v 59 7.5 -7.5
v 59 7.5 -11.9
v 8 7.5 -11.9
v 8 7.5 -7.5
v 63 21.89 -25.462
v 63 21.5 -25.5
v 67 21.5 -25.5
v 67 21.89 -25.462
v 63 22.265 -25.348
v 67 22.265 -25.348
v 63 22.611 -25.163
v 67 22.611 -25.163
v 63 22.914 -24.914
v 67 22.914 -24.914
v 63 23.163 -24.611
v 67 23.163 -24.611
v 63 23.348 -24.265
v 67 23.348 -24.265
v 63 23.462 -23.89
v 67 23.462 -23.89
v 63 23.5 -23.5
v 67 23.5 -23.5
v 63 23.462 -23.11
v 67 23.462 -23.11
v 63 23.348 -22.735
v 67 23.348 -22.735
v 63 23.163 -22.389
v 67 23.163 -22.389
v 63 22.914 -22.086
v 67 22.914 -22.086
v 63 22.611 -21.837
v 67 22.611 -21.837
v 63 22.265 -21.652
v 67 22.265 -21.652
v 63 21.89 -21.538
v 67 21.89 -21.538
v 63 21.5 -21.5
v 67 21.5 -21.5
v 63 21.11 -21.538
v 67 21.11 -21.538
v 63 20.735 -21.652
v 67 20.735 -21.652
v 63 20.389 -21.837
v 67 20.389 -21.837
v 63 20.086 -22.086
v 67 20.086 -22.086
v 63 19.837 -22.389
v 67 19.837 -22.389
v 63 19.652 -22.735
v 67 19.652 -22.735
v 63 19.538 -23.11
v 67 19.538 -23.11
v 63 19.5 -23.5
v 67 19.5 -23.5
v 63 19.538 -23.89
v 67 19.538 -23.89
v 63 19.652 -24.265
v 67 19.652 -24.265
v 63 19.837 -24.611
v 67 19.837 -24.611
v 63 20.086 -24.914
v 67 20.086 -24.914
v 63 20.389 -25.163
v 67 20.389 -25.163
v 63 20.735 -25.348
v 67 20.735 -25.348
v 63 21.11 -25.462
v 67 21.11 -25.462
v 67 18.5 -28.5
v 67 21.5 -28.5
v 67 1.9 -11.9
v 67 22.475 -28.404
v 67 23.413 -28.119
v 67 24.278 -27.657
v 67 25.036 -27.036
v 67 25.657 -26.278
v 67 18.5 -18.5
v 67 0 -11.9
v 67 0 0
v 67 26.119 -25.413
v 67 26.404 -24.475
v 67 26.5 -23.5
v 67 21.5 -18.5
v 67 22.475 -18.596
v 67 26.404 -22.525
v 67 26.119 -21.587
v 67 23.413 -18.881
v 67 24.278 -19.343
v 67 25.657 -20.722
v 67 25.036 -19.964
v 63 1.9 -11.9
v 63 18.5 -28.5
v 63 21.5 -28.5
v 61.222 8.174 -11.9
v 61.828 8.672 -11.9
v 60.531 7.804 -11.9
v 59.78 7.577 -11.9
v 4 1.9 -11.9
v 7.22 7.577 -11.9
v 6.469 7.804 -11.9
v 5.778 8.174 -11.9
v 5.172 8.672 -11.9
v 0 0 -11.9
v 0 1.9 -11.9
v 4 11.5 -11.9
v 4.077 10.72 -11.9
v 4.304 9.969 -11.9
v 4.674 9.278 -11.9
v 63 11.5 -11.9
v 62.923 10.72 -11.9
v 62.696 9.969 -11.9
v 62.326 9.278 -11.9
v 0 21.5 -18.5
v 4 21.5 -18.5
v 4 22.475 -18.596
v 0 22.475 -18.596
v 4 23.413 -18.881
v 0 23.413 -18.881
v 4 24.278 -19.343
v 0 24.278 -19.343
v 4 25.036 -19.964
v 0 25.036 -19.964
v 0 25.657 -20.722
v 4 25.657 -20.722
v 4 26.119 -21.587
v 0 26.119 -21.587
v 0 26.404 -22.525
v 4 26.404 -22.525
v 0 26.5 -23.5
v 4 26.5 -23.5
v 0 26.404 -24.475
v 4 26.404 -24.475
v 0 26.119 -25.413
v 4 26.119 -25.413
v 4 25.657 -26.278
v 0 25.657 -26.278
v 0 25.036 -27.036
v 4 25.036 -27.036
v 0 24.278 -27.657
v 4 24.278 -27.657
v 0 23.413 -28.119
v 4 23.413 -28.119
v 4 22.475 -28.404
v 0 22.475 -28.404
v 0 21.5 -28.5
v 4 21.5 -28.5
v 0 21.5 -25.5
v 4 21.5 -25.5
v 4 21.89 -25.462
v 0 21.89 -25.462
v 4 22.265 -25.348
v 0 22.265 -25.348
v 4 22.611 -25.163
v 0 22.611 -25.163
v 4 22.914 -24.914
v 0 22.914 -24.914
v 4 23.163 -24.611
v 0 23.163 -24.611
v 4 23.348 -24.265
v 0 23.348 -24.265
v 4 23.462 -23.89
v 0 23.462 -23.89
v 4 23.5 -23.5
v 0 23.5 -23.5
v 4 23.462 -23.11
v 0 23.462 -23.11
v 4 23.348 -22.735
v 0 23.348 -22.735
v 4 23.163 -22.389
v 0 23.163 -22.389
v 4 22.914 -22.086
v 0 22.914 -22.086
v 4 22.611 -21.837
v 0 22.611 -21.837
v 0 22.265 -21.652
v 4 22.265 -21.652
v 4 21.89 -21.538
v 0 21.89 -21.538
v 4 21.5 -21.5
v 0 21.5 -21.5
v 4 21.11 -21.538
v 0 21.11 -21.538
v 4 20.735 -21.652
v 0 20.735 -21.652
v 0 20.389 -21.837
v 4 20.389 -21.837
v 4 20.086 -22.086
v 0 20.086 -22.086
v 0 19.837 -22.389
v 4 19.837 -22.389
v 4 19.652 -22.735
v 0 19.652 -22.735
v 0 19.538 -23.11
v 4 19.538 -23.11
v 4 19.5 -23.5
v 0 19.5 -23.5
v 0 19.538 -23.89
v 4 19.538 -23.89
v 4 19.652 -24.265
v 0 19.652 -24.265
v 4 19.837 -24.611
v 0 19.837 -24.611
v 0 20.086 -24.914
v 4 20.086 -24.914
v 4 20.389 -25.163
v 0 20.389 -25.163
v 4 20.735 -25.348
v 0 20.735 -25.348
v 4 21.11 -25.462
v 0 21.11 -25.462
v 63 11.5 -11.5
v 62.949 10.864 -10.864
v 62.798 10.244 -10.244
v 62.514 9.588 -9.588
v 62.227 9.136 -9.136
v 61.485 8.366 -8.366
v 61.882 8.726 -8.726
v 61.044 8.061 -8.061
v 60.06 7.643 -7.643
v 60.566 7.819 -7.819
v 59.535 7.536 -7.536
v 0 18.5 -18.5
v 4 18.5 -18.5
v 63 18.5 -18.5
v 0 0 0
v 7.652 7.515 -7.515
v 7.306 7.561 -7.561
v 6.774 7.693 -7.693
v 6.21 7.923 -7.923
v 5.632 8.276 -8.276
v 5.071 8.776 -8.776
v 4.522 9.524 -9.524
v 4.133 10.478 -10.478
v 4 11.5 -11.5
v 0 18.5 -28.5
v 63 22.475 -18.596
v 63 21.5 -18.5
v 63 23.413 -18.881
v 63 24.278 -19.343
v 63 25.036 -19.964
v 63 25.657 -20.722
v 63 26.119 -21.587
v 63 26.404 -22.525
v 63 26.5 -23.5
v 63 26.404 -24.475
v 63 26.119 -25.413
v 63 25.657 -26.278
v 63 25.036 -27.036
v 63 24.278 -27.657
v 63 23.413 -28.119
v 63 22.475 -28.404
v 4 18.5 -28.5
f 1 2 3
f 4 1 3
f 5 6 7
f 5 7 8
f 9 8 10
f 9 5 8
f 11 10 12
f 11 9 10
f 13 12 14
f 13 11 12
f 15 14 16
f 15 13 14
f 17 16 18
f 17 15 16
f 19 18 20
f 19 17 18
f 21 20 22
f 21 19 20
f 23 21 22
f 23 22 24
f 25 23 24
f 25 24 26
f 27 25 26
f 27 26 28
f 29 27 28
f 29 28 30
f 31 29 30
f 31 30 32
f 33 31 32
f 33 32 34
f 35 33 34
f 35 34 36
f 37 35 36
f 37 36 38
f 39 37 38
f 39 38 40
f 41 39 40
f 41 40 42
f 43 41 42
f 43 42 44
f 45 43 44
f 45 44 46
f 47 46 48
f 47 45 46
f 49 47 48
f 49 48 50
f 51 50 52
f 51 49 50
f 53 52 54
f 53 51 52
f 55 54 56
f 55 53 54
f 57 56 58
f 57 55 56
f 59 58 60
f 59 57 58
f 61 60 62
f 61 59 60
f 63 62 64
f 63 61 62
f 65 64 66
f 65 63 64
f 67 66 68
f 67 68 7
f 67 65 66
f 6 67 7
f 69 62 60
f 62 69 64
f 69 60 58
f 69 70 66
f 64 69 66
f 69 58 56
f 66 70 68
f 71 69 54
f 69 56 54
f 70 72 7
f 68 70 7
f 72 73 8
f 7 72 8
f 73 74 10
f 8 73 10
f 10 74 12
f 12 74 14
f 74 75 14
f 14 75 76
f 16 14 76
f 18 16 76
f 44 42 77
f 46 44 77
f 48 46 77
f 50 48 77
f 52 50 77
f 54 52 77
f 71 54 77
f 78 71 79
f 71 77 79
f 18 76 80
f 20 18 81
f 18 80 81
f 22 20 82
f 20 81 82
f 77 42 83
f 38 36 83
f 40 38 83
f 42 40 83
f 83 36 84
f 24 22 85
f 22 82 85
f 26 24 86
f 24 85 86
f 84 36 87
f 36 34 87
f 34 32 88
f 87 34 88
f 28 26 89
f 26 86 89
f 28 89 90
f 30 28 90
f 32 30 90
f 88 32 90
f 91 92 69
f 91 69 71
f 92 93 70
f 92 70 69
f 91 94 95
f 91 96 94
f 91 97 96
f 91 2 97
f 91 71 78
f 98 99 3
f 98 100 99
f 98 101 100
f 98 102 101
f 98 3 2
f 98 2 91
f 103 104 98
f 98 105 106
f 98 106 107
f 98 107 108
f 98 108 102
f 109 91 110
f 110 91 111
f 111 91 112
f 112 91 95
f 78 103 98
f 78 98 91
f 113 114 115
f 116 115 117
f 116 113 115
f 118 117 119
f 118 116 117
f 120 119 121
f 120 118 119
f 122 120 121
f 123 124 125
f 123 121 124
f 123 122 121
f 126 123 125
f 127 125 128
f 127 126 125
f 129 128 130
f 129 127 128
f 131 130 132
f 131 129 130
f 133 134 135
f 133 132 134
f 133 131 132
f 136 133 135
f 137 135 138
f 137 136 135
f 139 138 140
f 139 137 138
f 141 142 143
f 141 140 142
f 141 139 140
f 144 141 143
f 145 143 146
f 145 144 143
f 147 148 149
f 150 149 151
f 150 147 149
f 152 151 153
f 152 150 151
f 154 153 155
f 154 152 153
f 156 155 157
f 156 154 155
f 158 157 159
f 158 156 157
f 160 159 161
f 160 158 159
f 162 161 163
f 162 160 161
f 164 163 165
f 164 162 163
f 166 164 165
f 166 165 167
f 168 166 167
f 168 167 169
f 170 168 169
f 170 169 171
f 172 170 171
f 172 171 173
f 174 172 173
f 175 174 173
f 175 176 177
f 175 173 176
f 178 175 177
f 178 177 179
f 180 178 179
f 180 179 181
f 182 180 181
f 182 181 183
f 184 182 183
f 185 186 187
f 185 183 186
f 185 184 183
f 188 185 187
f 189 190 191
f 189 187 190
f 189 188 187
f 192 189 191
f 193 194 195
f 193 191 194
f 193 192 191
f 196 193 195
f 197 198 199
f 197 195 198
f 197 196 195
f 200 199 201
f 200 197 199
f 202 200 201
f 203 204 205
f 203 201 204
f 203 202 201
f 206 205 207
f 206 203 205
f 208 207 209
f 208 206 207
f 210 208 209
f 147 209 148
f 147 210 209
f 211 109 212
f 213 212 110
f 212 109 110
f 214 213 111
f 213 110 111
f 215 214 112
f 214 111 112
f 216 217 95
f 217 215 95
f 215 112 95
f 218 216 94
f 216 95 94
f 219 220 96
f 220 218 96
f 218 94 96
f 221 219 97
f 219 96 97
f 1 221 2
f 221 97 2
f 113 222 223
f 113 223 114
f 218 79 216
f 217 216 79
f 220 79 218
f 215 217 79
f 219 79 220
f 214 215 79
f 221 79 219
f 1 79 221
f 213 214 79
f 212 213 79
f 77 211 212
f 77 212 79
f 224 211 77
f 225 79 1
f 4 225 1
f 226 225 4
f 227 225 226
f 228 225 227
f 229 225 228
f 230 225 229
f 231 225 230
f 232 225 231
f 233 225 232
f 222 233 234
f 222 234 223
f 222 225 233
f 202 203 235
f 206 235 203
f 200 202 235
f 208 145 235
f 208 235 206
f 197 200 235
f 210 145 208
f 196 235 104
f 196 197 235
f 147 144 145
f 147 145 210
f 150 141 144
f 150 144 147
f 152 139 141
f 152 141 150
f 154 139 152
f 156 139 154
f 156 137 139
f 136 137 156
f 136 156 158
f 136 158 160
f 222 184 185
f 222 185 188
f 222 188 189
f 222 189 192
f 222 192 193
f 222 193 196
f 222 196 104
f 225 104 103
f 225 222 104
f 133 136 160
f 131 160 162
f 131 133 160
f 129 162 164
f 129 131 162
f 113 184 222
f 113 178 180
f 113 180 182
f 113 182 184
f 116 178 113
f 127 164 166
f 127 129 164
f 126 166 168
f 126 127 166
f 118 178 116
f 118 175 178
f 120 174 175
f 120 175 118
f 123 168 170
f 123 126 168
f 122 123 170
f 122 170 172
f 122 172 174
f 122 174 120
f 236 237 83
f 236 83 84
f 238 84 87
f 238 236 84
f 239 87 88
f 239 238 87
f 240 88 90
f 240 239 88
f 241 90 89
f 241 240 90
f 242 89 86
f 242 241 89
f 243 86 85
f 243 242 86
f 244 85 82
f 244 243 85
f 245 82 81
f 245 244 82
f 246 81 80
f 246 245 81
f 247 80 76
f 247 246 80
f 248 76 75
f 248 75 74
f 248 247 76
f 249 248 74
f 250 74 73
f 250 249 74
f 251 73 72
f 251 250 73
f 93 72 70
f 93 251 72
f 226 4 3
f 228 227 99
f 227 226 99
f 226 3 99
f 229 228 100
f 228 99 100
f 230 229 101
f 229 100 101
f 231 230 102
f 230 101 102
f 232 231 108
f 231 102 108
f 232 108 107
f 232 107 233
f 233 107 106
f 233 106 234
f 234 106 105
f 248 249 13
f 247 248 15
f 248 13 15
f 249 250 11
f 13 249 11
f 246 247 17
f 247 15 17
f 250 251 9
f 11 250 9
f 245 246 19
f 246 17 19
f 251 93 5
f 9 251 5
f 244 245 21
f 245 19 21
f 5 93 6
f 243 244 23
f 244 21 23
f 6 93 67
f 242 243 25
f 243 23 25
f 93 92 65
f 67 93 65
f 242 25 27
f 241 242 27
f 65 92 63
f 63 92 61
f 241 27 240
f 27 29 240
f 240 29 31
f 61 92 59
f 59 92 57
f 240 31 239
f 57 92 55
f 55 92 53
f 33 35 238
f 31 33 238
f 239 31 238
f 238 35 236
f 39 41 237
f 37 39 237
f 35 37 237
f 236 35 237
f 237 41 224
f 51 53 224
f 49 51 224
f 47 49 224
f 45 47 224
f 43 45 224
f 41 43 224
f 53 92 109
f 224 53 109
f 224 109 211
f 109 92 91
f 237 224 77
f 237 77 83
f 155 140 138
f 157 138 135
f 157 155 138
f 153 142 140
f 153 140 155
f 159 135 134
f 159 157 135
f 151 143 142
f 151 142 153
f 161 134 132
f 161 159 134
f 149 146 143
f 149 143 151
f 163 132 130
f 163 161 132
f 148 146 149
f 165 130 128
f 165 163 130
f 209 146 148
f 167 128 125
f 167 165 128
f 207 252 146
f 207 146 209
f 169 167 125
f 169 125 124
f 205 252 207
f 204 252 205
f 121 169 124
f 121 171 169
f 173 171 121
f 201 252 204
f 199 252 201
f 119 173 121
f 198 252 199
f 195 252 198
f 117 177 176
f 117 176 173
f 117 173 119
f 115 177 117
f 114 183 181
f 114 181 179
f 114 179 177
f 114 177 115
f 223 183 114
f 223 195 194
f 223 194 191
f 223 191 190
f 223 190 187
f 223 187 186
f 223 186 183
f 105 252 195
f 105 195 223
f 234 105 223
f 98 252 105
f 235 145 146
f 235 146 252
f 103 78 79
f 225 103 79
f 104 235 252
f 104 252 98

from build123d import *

# Parameters (mm, degrees)
SKETCH1_R           = 2
BOSS_EXTRUDE1_DEPTH = 67
CUT_EXTRUDE1_REACH  = 30.5
CUT_EXTRUDE2_REACH  = 28.5
SKETCH3_W           = 59
SKETCH3_H           = 9.6


with BuildPart() as part:
    # Sketch1 → Boss-Extrude1 (new body)
    with BuildSketch(Plane(origin=(0, 0, 0), x_dir=(0, 0, -1), z_dir=(1, 0, 0))):
        with BuildLine():
            Line((11.9, 1.9), (11.9, 0))
            Line((11.9, 0), (0, 0))
            Line((0, 0), (18.5, 18.5))
            Line((18.5, 18.5), (18.5, 21.5))
            ThreePointArc((18.5, 21.5), (23.5, 26.5), (28.5, 21.5))
            Line((28.5, 21.5), (28.5, 18.5))
            Line((28.5, 18.5), (11.9, 1.9))
        make_face()
        with Locations((23.5, 21.5)):
            Circle(SKETCH1_R, mode=Mode.SUBTRACT)
    extrude(amount=BOSS_EXTRUDE1_DEPTH)

    # Sketch2 → Cut-Extrude1 (cut, up to next)
    with BuildSketch(Plane(origin=(0, 0, -28.5), x_dir=(-1, 0, 0), z_dir=(0, 0, -1)), mode=Mode.PRIVATE) as cut_extrude1_sk1:
        with BuildLine():
            Line((-63, 26.5), (-63, 11.5))
            ThreePointArc((-63, 11.5), (-61.828427125, 8.671572875), (-59, 7.5))
            Line((-59, 7.5), (-8, 7.5))
            ThreePointArc((-8, 7.5), (-5.171572875, 8.671572875), (-4, 11.5))
            Line((-4, 11.5), (-4, 26.5))
            Line((-4, 26.5), (-63, 26.5))
        make_face()
    cut_extrude1_tool1 = extrude(cut_extrude1_sk1.sketch, amount=-CUT_EXTRUDE1_REACH, mode=Mode.PRIVATE) & part.part
    add(cut_extrude1_tool1.solids().sort_by_distance((33.5, 17.053049, -28.5))[0], mode=Mode.SUBTRACT)

    # Sketch3 → Cut-Extrude2 (cut, up to next)
    with BuildSketch(Plane.XZ, mode=Mode.PRIVATE) as cut_extrude2_sk1:
        with Locations((33.5, -16.7)):
            Rectangle(SKETCH3_W, SKETCH3_H)
    cut_extrude2_tool1 = extrude(cut_extrude2_sk1.sketch, amount=-CUT_EXTRUDE2_REACH, mode=Mode.PRIVATE) & part.part
    add(cut_extrude2_tool1.solids().sort_by_distance((33.5, 0, -16.7))[0], mode=Mode.SUBTRACT)


solid = part.part
